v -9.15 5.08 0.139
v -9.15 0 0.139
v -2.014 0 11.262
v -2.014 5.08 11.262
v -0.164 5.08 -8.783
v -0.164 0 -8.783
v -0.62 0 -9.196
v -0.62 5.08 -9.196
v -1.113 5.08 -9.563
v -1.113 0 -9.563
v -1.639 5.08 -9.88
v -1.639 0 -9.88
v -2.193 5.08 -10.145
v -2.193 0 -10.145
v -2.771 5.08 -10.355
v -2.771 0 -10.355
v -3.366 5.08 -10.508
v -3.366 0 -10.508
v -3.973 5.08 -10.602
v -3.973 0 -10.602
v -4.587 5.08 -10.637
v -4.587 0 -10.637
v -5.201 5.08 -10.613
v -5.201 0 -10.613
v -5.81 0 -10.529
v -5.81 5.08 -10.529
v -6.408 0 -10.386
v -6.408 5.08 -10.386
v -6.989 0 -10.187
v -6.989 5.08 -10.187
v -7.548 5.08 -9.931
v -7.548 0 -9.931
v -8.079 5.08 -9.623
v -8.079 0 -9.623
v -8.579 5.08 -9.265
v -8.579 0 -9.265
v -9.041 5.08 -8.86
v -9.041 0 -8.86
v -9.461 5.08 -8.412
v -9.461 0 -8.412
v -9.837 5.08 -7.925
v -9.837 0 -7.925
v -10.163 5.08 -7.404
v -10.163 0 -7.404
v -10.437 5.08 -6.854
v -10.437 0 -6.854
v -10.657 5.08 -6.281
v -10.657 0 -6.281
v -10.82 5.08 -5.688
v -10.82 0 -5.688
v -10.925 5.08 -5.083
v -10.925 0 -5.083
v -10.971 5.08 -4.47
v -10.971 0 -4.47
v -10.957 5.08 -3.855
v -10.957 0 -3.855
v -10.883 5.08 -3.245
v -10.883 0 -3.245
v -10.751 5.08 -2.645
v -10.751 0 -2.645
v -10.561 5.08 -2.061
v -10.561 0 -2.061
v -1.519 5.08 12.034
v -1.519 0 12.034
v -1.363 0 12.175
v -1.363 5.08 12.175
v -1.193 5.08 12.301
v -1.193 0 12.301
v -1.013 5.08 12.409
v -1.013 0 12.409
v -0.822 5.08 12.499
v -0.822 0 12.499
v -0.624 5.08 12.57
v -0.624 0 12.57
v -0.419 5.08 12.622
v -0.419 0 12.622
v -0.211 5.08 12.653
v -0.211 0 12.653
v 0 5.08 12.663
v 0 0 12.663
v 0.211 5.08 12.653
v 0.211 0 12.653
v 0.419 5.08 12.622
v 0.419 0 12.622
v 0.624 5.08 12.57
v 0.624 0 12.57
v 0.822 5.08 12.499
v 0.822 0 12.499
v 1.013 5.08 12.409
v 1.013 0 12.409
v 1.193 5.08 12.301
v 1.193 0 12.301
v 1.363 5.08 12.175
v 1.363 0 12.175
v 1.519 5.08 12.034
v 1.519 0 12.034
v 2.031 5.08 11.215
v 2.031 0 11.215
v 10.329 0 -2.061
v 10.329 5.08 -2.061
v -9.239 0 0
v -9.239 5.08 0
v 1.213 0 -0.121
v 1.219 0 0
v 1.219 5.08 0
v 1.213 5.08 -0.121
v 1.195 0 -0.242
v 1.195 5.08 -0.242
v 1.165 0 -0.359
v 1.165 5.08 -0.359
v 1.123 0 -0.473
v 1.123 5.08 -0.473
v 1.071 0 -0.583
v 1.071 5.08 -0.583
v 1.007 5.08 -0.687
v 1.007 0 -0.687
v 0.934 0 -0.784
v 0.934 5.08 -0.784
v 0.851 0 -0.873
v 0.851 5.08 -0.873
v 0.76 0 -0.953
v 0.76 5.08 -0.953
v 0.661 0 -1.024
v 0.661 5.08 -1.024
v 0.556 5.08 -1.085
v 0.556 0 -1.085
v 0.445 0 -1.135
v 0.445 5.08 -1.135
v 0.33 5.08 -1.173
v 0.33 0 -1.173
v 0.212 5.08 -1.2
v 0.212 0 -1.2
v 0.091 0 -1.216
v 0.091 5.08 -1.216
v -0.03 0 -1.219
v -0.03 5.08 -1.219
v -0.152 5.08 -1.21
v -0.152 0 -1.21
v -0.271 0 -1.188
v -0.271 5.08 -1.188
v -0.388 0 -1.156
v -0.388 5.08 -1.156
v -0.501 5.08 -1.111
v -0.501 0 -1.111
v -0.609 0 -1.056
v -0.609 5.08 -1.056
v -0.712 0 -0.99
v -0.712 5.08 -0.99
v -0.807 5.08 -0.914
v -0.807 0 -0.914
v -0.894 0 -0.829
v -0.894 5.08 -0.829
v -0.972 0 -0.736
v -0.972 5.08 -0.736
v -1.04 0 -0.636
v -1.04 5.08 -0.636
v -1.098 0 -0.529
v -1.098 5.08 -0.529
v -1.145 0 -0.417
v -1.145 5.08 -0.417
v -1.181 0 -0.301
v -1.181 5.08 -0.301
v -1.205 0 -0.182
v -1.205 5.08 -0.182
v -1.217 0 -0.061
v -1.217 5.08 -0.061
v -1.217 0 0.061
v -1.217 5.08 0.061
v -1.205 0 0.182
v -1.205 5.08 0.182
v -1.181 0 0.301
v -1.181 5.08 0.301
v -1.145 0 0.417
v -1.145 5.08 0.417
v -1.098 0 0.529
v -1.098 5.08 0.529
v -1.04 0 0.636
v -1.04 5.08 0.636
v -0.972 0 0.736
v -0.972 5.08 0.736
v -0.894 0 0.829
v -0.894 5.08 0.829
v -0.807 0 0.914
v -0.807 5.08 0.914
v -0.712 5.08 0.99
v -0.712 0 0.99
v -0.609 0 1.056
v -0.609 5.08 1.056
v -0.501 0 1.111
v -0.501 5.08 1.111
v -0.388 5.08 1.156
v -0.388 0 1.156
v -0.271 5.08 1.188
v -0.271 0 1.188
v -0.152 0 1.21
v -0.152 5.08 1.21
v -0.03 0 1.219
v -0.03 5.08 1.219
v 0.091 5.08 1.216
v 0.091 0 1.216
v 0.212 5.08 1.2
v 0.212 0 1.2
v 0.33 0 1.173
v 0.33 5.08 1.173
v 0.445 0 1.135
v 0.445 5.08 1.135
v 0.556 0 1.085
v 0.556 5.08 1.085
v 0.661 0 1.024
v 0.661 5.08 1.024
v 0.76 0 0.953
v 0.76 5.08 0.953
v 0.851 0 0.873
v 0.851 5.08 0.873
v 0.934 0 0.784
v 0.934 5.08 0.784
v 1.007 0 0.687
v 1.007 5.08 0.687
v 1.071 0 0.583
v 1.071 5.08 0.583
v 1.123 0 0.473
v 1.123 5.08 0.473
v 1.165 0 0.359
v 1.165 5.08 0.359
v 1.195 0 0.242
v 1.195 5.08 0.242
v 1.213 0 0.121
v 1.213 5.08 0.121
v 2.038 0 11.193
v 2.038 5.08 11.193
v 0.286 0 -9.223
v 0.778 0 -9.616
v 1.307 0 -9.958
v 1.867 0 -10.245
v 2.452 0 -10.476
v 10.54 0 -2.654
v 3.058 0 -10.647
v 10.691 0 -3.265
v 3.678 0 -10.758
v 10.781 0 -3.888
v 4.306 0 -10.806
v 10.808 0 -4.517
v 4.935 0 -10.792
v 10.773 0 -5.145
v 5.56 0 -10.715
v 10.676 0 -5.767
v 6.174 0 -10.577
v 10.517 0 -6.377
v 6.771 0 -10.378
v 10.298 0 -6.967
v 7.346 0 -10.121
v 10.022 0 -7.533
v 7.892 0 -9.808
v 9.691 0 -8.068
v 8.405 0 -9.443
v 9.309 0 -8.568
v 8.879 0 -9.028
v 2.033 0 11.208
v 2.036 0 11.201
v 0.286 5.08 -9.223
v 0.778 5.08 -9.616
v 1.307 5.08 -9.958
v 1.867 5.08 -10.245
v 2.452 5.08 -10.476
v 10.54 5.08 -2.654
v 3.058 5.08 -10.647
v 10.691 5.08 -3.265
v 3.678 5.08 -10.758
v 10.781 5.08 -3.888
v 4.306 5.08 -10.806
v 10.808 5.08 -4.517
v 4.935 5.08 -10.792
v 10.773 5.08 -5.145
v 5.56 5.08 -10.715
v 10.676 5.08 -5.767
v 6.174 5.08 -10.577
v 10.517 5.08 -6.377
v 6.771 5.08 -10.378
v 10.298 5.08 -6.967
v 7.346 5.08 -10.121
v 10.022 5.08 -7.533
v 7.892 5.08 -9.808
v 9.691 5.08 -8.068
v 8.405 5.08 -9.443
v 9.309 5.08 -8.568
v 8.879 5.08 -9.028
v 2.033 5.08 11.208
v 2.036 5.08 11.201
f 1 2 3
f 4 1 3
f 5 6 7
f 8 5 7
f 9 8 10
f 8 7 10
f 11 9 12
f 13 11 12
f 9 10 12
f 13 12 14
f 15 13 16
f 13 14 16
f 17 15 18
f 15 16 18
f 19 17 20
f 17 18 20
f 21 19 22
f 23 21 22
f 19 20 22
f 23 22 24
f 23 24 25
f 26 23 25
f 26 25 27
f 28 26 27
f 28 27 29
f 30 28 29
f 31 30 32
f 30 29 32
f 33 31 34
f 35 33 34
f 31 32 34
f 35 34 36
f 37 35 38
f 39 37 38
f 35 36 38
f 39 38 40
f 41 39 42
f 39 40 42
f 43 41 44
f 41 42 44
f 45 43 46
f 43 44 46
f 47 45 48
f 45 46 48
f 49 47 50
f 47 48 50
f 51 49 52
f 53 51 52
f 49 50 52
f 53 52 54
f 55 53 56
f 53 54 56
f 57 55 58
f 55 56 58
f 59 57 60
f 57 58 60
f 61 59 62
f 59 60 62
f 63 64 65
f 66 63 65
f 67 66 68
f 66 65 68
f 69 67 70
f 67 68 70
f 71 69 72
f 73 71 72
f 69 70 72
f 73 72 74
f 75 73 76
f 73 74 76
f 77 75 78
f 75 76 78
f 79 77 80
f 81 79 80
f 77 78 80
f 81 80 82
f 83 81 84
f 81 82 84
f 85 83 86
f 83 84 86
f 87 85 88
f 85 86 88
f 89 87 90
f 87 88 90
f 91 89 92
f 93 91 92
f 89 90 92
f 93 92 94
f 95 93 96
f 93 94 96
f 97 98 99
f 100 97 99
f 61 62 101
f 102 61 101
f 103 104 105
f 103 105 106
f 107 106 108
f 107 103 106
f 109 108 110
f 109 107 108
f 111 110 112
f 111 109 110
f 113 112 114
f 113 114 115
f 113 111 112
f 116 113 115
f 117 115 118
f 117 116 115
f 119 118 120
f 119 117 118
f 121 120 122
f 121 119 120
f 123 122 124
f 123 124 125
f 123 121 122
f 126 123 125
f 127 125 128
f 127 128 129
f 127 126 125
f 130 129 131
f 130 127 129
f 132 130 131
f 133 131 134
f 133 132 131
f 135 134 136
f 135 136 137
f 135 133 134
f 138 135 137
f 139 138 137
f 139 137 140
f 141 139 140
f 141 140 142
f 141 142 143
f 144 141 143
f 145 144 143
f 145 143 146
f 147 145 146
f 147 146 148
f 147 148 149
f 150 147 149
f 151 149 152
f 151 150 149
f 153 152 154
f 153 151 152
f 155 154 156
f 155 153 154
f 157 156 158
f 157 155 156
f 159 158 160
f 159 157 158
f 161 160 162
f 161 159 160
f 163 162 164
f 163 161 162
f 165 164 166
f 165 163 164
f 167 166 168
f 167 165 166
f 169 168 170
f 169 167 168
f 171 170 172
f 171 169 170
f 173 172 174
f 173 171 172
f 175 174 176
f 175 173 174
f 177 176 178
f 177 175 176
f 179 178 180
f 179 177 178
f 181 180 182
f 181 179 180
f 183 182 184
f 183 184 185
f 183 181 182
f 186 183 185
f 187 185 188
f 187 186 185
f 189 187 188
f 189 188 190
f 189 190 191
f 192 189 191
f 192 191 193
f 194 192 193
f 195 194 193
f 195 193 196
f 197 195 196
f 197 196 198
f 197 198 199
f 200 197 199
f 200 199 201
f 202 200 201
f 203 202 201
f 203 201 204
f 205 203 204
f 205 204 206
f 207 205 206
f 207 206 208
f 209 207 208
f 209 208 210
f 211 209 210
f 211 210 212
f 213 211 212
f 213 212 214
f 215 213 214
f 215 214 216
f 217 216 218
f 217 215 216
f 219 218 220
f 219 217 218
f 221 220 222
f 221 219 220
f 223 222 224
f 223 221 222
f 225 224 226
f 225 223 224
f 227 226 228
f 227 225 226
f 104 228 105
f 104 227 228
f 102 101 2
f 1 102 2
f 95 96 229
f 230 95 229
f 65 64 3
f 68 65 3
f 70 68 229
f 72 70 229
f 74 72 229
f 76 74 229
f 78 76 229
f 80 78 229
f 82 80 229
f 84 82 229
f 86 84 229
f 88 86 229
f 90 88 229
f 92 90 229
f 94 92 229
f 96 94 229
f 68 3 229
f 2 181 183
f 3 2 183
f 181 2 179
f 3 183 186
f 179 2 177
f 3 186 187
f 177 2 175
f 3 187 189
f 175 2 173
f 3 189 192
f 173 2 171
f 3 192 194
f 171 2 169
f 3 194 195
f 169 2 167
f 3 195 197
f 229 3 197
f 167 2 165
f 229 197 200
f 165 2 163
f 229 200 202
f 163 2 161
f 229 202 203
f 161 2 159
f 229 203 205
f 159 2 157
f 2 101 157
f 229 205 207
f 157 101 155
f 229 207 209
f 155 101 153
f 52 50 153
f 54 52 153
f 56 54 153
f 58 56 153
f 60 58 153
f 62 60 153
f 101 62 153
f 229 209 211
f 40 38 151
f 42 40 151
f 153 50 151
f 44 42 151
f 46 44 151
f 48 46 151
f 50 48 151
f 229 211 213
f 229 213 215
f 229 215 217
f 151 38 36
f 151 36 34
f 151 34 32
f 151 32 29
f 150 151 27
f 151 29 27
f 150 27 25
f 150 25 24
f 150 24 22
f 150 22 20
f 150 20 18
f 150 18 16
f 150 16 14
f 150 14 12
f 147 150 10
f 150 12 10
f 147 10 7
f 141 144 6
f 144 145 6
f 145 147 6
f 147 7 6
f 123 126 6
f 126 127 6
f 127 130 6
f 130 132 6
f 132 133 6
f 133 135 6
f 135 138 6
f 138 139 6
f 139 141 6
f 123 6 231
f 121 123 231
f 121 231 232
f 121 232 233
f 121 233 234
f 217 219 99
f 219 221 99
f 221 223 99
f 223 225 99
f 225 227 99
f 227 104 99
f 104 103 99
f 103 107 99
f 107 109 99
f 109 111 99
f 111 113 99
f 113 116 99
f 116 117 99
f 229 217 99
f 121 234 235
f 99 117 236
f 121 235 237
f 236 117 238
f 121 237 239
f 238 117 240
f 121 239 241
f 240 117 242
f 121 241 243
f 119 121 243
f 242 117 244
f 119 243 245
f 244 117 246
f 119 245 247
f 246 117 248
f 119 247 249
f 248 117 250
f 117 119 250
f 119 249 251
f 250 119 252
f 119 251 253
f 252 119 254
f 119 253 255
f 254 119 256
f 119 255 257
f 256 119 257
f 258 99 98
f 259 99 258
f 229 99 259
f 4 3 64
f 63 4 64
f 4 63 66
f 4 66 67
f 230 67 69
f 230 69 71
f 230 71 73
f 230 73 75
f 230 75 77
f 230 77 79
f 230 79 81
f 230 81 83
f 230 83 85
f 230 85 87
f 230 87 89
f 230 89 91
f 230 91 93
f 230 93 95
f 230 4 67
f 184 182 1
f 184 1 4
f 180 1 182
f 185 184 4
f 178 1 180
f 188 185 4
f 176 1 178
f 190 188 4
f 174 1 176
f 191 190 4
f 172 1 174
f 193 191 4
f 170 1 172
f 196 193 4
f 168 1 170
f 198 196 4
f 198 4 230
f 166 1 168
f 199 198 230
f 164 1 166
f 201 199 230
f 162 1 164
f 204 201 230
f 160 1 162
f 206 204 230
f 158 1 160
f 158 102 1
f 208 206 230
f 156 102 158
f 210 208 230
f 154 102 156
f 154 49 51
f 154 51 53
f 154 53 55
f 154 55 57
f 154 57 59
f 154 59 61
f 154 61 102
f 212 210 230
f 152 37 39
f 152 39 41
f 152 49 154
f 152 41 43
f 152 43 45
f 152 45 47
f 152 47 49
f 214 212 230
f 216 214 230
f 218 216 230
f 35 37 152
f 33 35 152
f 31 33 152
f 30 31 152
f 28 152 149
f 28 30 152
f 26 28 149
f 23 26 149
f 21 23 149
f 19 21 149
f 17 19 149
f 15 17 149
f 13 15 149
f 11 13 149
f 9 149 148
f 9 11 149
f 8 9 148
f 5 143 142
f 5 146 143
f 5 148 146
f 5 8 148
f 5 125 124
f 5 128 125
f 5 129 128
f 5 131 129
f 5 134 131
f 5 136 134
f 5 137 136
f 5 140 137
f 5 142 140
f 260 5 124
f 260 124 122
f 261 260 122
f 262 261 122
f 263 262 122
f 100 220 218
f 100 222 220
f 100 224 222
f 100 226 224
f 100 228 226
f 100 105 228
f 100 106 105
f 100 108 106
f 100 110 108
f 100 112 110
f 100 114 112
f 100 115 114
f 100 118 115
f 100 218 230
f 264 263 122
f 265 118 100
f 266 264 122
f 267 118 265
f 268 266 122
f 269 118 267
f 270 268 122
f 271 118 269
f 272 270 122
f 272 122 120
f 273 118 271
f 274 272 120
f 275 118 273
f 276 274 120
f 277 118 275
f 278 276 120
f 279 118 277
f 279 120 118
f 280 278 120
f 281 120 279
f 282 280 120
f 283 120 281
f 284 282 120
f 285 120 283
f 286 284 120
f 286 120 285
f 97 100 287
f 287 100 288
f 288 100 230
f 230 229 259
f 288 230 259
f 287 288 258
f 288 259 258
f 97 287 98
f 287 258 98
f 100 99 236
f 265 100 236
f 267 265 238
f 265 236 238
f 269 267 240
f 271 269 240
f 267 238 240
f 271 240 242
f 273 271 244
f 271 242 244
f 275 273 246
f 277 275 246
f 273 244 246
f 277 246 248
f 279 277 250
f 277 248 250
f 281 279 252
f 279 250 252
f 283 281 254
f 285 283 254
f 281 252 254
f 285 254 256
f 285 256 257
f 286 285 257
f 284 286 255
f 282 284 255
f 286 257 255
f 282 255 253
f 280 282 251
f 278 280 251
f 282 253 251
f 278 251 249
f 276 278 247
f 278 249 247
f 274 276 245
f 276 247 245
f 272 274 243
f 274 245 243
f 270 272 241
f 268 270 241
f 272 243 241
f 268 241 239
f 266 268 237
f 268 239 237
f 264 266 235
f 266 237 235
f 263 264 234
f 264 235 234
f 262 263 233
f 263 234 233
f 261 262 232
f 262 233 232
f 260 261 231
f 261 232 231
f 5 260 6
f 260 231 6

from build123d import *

# Parameters (mm, degrees)
SKETCH1_R           = 1.218989221
BOSS_EXTRUDE6_DEPTH = 5.08


with BuildPart() as part:
    # Sketch1 → Boss-Extrude6 (new body)
    with BuildSketch(Plane(origin=(0, 0, 0), x_dir=(1, 0, 0), z_dir=(0, 1, 0))):
        with BuildLine():
            ThreePointArc((-1.519001557, -12.033660962), (0, -12.662852008), (1.519001557, -12.033660962))
            Line((1.519001557, -12.033660962), (2.038136122, -11.193432272))
            ThreePointArc((2.038136122, -11.193432272), (2.034563062, -11.204068286), (2.030934498, -11.214685493))
            Line((2.030934498, -11.214685493), (10.329167319, 2.060586649))
            ThreePointArc((10.329167319, 2.060586649), (7.892426257, 9.808202336), (-0.164422722, 8.783292397))
            ThreePointArc((-0.164422722, 8.783292397), (-8.079308366, 9.623050723), (-10.561191909, 2.060586649))
            Line((-10.561191909, 2.060586649), (-9.239218773, 0))
            Line((-9.239218773, 0), (-9.150338425, -0.138539621))
            Line((-9.150338425, -0.138539621), (-2.013925132, -11.262213432))
            Line((-2.013925132, -11.262213432), (-1.519001557, -12.033660962))
        make_face()
        Circle(SKETCH1_R, mode=Mode.SUBTRACT)
    extrude(amount=BOSS_EXTRUDE6_DEPTH)


solid = part.part
